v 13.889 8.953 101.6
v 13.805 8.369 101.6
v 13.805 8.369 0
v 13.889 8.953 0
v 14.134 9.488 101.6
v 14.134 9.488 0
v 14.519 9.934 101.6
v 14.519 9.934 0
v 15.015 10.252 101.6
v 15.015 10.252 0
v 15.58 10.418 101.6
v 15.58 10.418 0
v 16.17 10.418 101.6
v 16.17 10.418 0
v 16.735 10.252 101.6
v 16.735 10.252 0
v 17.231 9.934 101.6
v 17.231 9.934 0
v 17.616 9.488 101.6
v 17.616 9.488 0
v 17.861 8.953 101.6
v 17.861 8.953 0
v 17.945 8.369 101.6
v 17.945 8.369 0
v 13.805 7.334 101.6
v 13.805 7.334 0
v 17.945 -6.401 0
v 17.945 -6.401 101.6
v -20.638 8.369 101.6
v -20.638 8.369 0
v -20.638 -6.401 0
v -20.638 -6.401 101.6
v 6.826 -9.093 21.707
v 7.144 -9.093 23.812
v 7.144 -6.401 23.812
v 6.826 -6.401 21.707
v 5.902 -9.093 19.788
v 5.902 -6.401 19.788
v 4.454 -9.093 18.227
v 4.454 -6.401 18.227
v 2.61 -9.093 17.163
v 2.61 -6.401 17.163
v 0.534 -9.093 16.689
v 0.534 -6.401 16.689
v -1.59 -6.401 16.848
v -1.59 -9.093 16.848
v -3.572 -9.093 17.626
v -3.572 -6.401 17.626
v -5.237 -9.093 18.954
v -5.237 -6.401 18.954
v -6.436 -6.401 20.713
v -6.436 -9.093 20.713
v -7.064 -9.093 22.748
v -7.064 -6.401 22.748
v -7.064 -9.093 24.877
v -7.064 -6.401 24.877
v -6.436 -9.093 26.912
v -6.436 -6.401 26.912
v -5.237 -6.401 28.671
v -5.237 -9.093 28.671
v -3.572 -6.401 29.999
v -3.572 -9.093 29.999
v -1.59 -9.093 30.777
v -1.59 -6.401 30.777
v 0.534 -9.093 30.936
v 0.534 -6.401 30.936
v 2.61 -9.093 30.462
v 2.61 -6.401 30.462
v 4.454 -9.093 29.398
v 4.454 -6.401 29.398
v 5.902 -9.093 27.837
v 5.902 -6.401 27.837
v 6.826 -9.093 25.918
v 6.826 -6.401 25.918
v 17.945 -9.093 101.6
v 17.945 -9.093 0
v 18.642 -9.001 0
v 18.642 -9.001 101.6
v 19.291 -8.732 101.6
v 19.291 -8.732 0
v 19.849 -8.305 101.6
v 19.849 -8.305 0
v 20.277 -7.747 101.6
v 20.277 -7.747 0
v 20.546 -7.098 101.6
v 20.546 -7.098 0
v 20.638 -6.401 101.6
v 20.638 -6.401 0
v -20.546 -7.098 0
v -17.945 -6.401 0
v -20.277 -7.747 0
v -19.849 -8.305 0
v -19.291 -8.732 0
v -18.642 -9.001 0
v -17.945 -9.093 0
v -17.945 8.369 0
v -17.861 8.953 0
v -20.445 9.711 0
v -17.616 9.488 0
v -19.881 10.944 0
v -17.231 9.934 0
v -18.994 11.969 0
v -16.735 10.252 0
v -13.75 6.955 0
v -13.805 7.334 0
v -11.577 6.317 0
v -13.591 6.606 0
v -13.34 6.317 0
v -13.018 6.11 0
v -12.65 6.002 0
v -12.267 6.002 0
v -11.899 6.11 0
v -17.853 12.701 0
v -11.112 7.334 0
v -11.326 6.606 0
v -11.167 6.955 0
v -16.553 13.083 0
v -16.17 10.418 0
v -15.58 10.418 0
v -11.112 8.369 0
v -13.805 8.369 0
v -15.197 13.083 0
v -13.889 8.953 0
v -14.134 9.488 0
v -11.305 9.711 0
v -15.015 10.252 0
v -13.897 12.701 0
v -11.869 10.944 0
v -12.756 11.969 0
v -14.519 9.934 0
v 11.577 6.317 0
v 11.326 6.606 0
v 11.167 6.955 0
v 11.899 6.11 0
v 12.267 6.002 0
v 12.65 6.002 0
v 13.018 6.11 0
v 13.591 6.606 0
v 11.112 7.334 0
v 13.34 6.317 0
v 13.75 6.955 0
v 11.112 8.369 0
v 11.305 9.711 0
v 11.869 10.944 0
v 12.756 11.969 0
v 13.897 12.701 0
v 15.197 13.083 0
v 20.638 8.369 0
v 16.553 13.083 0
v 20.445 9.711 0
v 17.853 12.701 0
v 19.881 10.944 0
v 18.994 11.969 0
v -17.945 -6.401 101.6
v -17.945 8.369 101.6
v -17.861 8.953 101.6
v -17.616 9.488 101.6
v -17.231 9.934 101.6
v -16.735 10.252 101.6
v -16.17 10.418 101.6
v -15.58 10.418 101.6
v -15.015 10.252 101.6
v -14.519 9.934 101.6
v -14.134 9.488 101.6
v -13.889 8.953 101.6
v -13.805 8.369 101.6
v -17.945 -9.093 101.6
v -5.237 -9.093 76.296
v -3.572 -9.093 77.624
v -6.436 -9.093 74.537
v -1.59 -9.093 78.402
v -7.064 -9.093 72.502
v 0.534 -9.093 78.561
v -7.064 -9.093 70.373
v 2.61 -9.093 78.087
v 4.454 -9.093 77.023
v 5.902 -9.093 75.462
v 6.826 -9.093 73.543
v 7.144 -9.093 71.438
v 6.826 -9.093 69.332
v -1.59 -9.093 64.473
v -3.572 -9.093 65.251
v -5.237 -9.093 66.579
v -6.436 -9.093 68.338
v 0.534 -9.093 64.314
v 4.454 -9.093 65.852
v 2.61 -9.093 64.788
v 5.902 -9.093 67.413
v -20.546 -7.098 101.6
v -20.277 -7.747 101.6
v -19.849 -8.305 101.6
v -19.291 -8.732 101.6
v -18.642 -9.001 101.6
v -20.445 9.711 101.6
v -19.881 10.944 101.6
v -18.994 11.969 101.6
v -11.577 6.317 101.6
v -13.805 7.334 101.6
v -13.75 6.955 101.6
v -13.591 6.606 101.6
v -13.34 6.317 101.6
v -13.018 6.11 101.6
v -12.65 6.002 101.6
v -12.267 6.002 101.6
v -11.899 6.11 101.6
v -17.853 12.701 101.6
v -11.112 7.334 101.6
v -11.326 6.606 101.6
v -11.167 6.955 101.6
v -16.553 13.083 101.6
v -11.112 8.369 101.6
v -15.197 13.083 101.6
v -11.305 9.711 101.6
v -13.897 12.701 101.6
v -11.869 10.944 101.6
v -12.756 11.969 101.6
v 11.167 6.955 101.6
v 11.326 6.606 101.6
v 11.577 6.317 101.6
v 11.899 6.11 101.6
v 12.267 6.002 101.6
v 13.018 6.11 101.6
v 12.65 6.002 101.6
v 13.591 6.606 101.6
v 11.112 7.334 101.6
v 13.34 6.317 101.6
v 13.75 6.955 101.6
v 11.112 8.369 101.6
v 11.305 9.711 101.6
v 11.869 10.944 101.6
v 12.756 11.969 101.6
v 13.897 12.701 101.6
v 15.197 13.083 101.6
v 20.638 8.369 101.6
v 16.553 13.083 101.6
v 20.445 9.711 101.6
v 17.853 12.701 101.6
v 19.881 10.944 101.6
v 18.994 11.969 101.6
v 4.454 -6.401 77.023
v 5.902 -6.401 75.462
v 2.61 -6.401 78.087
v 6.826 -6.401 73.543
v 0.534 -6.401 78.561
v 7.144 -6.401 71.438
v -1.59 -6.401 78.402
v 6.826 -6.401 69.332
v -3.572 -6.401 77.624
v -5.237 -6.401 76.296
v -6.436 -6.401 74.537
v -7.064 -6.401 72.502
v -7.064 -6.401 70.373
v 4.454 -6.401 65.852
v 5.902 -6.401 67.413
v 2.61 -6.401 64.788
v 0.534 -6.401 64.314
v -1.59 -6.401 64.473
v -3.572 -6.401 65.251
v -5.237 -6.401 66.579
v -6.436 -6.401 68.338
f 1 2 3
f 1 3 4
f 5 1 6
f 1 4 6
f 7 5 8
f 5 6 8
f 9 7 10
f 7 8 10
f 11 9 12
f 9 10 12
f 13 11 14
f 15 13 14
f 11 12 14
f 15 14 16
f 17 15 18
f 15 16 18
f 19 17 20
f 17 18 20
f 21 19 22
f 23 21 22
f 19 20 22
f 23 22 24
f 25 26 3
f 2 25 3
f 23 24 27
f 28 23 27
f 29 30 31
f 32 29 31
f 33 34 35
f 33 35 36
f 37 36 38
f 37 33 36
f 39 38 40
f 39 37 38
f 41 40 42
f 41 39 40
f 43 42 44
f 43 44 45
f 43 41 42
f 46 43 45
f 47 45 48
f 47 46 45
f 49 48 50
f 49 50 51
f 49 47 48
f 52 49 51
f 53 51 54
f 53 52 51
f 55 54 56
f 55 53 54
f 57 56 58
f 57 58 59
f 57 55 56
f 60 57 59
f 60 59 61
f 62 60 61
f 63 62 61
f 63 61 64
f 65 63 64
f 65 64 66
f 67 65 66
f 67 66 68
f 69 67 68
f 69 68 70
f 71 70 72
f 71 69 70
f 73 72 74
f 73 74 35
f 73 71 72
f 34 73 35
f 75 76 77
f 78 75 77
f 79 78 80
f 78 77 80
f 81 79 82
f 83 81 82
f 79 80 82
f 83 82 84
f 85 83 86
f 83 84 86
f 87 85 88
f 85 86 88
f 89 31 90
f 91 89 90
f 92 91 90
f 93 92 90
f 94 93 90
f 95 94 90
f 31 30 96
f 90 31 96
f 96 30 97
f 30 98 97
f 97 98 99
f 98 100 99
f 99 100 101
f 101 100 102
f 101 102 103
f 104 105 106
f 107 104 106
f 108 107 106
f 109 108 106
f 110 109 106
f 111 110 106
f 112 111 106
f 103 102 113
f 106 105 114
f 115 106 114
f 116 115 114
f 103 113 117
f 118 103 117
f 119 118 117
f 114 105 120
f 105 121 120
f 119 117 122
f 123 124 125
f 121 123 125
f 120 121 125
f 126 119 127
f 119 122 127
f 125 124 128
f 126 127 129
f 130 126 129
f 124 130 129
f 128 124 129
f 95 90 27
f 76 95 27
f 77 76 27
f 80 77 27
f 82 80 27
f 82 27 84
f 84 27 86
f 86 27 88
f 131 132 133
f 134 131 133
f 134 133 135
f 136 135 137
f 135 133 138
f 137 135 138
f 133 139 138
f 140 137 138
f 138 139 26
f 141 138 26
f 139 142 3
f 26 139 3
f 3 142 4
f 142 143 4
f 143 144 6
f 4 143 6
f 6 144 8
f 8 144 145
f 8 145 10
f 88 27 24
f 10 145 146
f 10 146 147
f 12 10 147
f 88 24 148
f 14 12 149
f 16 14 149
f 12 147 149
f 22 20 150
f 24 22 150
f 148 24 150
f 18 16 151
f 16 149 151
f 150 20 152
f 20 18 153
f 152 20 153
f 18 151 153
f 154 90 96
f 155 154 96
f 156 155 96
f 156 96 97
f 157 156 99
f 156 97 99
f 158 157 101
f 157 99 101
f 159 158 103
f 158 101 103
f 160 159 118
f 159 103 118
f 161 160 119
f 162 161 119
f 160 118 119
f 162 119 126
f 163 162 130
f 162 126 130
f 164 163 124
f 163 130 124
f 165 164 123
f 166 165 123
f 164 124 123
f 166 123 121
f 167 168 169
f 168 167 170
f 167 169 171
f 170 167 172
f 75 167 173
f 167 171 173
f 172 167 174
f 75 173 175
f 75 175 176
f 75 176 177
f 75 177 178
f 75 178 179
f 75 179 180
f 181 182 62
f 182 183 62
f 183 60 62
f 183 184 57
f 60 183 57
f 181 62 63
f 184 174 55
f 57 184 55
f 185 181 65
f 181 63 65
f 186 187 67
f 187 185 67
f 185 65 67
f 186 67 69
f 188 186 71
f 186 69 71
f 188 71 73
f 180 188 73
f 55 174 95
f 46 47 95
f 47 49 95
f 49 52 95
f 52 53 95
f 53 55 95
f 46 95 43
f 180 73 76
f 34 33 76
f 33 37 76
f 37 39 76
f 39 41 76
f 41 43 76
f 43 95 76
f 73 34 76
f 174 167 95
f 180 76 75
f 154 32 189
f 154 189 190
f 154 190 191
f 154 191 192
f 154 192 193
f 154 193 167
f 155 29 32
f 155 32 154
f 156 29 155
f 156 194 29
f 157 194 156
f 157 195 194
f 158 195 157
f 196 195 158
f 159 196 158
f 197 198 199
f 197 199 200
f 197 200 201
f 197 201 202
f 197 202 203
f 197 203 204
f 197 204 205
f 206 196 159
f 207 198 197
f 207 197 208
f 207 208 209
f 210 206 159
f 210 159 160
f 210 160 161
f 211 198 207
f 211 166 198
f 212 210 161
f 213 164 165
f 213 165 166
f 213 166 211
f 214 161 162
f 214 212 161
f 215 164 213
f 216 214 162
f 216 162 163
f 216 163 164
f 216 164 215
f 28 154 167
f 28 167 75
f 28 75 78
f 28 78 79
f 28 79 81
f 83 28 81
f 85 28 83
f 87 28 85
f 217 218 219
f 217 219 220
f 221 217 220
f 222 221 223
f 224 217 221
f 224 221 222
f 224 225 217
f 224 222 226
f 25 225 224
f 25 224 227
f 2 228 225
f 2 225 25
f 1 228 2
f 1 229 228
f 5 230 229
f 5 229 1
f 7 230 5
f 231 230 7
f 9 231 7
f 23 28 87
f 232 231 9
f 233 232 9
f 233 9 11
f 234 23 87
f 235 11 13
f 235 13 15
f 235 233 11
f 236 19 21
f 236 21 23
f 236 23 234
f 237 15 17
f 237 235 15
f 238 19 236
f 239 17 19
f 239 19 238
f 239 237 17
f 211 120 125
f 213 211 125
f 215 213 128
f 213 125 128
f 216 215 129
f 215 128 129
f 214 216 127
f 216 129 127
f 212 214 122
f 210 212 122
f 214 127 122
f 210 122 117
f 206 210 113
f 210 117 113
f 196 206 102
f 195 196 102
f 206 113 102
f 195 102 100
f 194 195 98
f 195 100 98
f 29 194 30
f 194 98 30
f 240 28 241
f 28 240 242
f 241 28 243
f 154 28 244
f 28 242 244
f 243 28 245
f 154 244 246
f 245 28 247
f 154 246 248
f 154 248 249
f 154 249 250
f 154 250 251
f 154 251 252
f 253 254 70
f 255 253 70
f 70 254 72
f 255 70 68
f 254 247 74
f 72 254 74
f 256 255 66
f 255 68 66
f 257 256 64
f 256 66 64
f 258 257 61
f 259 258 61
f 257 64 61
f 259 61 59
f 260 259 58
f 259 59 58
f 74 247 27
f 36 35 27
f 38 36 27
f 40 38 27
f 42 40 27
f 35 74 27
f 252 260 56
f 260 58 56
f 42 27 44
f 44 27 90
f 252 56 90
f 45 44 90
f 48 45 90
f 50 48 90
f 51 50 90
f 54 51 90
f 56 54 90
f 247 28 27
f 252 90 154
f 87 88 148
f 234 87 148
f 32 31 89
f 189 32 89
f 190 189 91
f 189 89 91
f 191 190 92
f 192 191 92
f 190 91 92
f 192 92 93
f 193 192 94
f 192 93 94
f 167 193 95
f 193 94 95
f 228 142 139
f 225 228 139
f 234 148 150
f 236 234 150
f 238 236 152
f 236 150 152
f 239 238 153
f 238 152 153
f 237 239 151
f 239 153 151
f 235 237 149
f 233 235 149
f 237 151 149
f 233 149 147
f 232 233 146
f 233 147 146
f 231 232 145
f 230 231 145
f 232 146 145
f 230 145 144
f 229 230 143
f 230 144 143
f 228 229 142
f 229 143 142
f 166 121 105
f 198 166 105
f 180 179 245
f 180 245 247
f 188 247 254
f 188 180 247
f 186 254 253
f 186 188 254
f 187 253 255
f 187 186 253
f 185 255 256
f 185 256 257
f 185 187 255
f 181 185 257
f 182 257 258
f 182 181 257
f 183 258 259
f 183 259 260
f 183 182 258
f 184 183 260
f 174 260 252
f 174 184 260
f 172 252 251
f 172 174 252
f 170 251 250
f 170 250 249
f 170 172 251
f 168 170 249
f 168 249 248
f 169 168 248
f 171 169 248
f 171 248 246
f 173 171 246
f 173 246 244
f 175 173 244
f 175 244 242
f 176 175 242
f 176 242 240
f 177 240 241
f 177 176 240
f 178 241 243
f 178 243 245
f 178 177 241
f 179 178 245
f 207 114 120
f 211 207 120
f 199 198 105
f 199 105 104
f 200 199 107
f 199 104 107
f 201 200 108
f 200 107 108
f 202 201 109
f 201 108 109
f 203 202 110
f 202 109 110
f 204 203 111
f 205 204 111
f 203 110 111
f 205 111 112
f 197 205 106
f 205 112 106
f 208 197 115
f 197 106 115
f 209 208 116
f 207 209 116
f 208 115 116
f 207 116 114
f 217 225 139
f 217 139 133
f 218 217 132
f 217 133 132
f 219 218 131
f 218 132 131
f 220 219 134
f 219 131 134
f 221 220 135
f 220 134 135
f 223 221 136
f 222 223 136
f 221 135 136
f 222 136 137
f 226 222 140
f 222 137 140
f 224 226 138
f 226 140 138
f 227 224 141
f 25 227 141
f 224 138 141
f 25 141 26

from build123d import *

# Parameters (mm, degrees)
BASE_EXTRUDE_DEPTH = 101.6
HOLE1_START        = -9.0932
HOLE1_OUTLINE_R    = 7.14375
HOLE1_DEPTH        = 2.6924
LPATTERN2_COUNT    = 2
LPATTERN2_PITCH    = 47.625


# Read off the part's stored shape, not the designer's step: Hole1
with BuildPart() as part:
    # Sketch1 → Base-Extrude (new body)
    with BuildSketch(Plane.XY):
        with BuildLine():
            Line((-20.6375, 8.3693), (-20.6375, -6.4008))
            ThreePointArc((-20.6375, -6.4008), (-19.848914298, -8.304614298), (-17.9451, -9.0932))
            Line((-17.9451, -9.0932), (17.9451, -9.0932))
            ThreePointArc((17.9451, -9.0932), (19.848914298, -8.304614298), (20.6375, -6.4008))
            Line((20.6375, -6.4008), (20.6375, 8.3693))
            ThreePointArc((20.6375, 8.3693), (15.875, 13.1318), (11.1125, 8.3693))
            Line((11.1125, 8.3693), (11.1125, 7.33425))
            ThreePointArc((11.1125, 7.33425), (12.4587, 5.98805), (13.8049, 7.33425))
            Line((13.8049, 7.33425), (13.8049, 8.3693))
            ThreePointArc((13.8049, 8.3693), (15.875, 10.4394), (17.9451, 8.3693))
            Line((17.9451, 8.3693), (17.9451, -6.4008))
            Line((17.9451, -6.4008), (-17.9451, -6.4008))
            Line((-17.9451, -6.4008), (-17.9451, 8.3693))
            ThreePointArc((-17.9451, 8.3693), (-15.875, 10.4394), (-13.8049, 8.3693))
            Line((-13.8049, 8.3693), (-13.8049, 7.33425))
            ThreePointArc((-13.8049, 7.33425), (-12.4587, 5.98805), (-11.1125, 7.33425))
            Line((-11.1125, 7.33425), (-11.1125, 8.3693))
            ThreePointArc((-11.1125, 8.3693), (-15.875, 13.1318), (-20.6375, 8.3693))
        make_face()
    extrude(amount=BASE_EXTRUDE_DEPTH)

    # Hole1 outline → Hole1 (cut)
    with BuildSketch(Plane(origin=(0, 0, 0), x_dir=(1, 0, 0), z_dir=(0, 1, 0)).offset(HOLE1_START)):
        with Locations((0, -23.8125)):
            Circle(HOLE1_OUTLINE_R)
    hole1 = extrude(amount=HOLE1_DEPTH, mode=Mode.SUBTRACT)

    # LPattern2: Hole1 ×2
    with Locations(*[(0, 0, i * LPATTERN2_PITCH) for i in range(1, LPATTERN2_COUNT)]):
        add(hole1, mode=Mode.SUBTRACT)


solid = part.part
